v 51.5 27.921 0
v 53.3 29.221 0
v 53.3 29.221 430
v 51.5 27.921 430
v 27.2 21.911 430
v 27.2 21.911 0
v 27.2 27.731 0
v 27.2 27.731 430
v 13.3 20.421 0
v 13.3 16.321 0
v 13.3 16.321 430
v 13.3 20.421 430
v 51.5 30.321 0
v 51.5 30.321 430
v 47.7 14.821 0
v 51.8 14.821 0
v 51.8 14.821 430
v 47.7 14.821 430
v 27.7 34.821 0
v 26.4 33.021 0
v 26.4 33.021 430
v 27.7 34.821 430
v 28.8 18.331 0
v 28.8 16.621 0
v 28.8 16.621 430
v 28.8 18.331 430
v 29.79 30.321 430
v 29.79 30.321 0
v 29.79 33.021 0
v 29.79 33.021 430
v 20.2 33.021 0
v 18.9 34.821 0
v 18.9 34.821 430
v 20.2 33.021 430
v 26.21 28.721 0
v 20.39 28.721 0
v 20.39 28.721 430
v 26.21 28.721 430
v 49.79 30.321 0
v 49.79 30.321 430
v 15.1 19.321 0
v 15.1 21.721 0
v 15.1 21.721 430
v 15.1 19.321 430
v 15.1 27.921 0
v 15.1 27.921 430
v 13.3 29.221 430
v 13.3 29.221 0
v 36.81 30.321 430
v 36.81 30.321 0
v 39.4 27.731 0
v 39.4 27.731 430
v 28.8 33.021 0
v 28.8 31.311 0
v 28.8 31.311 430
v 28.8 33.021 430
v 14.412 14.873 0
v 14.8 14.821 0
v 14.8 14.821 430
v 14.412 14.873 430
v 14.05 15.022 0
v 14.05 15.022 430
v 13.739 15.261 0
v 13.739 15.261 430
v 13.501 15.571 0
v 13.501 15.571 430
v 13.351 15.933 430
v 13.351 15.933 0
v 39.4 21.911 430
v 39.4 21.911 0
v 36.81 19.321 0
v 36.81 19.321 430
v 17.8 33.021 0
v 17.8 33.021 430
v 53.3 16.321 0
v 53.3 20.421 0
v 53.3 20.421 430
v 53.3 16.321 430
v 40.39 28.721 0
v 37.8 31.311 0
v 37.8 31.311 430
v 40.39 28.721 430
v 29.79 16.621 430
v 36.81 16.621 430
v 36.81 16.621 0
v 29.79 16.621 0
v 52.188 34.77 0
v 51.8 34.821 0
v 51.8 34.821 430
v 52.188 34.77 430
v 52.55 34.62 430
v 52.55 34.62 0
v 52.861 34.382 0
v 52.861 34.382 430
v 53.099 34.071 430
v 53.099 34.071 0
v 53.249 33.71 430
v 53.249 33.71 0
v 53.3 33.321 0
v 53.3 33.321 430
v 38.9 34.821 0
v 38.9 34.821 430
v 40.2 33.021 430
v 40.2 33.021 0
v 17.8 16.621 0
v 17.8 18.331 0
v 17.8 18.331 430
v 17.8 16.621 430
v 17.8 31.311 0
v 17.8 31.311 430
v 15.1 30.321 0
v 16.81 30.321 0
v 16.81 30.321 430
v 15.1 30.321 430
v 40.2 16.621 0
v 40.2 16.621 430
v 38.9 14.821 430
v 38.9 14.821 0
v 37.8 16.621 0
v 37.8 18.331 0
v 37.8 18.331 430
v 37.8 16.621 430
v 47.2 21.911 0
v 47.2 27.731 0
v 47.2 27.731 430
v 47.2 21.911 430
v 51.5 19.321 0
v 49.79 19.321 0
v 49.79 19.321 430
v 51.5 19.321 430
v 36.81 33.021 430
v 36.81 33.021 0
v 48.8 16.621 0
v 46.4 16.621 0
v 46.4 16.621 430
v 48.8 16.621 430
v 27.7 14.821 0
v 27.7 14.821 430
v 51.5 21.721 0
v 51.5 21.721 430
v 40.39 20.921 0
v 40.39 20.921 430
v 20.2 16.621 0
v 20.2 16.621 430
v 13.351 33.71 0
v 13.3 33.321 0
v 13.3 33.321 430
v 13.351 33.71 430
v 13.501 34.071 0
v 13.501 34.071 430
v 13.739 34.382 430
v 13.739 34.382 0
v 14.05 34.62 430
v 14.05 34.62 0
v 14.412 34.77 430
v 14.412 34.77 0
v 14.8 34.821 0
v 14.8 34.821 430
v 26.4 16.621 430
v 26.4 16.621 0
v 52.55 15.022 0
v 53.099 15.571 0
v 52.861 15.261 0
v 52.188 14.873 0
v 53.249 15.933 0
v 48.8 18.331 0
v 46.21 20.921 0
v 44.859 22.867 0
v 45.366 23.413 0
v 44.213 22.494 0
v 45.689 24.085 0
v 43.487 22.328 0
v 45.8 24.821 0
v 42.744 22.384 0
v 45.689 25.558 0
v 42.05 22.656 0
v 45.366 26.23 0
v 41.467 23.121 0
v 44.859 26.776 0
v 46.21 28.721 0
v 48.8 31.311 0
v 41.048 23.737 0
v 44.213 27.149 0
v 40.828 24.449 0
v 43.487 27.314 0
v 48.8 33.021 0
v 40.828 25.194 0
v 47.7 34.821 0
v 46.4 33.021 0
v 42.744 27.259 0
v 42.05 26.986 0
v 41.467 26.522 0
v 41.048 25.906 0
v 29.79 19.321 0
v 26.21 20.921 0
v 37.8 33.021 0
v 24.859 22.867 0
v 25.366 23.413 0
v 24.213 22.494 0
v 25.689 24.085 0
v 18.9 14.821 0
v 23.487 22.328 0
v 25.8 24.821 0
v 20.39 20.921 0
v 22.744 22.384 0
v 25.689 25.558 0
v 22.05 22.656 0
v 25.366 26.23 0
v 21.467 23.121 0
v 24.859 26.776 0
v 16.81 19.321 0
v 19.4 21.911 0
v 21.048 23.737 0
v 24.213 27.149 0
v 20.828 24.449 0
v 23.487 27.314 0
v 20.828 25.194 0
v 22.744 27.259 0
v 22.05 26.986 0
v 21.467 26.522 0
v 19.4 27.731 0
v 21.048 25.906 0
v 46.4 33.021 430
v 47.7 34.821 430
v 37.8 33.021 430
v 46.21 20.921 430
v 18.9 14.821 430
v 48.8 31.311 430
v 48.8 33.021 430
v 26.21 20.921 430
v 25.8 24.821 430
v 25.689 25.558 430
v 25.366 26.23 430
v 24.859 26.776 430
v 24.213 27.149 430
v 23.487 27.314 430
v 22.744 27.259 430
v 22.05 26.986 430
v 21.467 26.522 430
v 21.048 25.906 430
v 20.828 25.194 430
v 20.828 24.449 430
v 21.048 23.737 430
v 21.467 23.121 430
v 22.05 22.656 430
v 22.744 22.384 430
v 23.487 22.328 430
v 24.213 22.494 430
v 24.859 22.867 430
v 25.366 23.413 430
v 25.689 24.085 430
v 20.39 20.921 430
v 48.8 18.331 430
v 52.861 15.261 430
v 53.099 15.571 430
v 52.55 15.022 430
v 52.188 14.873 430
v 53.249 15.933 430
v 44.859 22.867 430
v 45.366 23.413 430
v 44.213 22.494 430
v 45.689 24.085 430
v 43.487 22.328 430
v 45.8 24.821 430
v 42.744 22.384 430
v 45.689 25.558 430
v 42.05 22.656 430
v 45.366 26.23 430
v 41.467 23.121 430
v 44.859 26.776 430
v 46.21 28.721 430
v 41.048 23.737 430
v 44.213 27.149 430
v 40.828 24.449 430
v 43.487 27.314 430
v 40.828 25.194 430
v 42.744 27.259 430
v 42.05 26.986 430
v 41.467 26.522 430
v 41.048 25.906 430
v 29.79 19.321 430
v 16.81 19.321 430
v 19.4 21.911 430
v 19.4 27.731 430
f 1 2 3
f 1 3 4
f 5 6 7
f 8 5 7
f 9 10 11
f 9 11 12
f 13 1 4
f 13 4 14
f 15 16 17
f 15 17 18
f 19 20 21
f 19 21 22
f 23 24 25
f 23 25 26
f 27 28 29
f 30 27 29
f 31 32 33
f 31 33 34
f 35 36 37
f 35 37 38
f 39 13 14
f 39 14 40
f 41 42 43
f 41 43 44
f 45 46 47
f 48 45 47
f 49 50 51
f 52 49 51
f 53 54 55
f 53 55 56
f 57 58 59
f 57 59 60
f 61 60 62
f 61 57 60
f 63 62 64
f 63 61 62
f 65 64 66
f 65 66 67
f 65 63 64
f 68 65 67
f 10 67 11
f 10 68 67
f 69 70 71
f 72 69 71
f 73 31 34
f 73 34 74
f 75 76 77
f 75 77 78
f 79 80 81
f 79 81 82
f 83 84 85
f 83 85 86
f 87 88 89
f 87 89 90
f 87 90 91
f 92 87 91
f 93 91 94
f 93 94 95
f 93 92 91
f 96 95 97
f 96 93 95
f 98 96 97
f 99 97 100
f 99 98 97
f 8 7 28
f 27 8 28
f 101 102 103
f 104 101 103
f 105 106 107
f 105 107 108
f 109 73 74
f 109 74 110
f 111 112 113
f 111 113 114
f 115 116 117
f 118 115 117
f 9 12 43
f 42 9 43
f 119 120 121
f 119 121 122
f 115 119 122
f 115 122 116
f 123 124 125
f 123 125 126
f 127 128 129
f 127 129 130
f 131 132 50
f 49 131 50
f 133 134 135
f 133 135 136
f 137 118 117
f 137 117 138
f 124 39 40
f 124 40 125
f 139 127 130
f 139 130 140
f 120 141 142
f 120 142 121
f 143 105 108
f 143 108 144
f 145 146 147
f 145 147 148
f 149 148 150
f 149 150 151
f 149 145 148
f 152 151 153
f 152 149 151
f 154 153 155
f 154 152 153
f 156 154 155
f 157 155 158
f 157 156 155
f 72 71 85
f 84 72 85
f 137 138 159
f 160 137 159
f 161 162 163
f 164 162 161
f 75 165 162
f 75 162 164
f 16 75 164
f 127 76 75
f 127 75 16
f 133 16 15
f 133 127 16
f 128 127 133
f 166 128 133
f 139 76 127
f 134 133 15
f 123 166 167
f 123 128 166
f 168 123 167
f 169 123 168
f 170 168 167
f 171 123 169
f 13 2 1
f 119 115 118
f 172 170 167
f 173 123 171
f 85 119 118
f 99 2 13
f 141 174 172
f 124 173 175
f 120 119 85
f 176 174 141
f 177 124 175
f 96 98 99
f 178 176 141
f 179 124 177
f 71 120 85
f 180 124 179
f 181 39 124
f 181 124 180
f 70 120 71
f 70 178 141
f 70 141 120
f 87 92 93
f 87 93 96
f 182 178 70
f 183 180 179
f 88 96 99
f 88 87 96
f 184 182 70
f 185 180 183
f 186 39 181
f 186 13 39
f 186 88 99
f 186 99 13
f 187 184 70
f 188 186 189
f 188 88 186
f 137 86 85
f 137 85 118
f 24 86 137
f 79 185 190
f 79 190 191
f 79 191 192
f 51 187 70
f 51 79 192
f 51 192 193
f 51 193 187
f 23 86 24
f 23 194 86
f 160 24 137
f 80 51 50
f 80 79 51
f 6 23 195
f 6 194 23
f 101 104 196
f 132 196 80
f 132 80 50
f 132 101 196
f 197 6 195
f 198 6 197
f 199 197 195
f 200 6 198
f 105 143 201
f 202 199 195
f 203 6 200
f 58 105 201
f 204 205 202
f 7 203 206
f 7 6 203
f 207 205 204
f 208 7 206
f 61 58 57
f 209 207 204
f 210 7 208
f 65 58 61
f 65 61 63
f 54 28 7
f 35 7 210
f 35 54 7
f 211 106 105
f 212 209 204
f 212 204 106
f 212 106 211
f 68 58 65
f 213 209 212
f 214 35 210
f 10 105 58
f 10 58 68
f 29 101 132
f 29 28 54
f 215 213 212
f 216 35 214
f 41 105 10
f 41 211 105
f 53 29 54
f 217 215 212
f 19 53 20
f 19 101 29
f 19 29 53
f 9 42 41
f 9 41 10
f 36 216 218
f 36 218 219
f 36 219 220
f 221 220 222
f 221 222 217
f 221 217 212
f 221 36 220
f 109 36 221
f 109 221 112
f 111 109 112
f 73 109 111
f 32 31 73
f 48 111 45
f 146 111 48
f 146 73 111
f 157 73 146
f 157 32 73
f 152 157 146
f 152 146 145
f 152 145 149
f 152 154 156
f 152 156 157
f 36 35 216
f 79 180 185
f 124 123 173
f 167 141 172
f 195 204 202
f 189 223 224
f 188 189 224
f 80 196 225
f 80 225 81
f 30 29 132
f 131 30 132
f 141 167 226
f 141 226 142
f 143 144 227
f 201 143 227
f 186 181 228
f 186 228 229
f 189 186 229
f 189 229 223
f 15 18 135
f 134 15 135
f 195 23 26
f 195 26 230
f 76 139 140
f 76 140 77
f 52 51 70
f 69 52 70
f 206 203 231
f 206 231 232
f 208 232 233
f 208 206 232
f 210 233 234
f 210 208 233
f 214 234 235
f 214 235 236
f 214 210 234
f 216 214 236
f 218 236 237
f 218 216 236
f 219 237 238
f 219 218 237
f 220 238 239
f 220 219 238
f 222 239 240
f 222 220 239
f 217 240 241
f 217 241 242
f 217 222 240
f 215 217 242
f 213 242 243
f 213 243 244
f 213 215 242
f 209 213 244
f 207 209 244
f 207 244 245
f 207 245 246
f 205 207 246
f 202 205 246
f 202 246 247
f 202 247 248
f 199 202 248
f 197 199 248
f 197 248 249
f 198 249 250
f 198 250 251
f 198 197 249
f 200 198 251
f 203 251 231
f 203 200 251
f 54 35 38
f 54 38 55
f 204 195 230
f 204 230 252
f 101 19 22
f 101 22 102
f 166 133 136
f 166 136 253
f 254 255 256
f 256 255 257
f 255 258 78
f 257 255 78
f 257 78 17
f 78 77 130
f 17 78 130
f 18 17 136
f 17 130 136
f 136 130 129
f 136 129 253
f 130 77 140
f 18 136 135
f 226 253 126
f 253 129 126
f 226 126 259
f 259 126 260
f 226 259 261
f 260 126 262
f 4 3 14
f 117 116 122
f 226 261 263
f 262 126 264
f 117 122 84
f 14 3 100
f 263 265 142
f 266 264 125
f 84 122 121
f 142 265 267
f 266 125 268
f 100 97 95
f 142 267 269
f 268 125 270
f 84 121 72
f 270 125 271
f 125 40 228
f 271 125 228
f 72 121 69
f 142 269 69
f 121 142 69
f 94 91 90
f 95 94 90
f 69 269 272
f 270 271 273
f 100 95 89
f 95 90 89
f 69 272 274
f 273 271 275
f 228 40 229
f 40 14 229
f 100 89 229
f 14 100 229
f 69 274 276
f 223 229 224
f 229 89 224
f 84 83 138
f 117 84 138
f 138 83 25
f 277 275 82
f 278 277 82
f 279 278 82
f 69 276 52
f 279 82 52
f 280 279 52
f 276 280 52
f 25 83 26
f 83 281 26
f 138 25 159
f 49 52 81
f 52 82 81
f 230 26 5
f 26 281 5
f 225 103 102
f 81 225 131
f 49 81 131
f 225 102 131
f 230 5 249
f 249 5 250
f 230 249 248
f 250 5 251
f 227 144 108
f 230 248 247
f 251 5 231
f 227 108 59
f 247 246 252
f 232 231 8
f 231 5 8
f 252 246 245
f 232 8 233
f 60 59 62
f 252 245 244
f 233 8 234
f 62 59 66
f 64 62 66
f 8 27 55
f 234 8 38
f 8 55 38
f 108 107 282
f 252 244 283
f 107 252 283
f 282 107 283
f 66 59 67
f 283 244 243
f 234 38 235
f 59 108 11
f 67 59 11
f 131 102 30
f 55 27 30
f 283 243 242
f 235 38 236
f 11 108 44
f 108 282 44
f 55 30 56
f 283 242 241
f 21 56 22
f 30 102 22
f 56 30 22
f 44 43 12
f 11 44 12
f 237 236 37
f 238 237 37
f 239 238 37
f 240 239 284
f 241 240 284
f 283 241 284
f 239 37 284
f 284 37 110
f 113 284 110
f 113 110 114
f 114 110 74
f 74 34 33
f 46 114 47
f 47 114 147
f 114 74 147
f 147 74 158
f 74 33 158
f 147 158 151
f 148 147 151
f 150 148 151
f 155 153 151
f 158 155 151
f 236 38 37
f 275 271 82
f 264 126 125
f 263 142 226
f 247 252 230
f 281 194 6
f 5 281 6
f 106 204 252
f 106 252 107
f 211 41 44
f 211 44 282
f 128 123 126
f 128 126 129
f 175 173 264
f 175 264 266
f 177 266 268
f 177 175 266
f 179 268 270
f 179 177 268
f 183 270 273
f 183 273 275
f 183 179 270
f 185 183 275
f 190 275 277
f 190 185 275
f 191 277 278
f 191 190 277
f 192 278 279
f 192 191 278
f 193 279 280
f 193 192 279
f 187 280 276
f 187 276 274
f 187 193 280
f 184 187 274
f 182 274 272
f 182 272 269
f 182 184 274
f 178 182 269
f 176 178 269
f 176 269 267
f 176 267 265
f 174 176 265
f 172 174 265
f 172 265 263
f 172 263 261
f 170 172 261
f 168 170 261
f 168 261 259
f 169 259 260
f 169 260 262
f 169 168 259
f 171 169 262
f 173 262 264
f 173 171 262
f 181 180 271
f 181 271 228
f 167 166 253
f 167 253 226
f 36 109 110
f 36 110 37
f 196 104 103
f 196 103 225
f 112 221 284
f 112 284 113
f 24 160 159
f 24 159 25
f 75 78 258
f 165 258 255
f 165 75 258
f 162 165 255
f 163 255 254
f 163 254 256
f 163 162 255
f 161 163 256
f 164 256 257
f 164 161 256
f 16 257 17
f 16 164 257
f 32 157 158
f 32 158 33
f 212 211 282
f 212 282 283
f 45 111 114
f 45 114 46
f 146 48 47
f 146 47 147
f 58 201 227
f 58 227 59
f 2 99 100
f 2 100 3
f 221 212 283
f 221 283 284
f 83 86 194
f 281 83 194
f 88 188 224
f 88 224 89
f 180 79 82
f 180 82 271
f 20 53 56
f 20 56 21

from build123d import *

# Parameters (mm, degrees)
SKETCH_1_R      = 2.5
EXTRUDE_1_DEPTH = 430


with BuildPart() as part:
    # 草图1 → 凸台-拉伸1 (new body)
    with BuildSketch(Plane.XY):
        with BuildLine():
            Line((14.8, 34.821428571), (18.9, 34.821428571))
            Line((18.9, 34.821428571), (20.2, 33.021428571))
            Line((20.2, 33.021428571), (17.8, 33.021428571))
            Line((17.8, 33.021428571), (17.8, 31.311378065))
            Line((17.8, 31.311378065), (20.389949494, 28.721428571))
            Line((20.389949494, 28.721428571), (26.210050506, 28.721428571))
            Line((26.210050506, 28.721428571), (28.8, 31.311378065))
            Line((28.8, 31.311378065), (28.8, 33.021428571))
            Line((28.8, 33.021428571), (26.4, 33.021428571))
            Line((26.4, 33.021428571), (27.7, 34.821428571))
            Line((27.7, 34.821428571), (38.9, 34.821428571))
            Line((38.9, 34.821428571), (40.2, 33.021428571))
            Line((40.2, 33.021428571), (37.8, 33.021428571))
            Line((37.8, 33.021428571), (37.8, 31.311378065))
            Line((37.8, 31.311378065), (40.389949494, 28.721428571))
            Line((40.389949494, 28.721428571), (46.210050506, 28.721428571))
            Line((46.210050506, 28.721428571), (48.8, 31.311378065))
            Line((48.8, 31.311378065), (48.8, 33.021428571))
            Line((48.8, 33.021428571), (46.4, 33.021428571))
            Line((46.4, 33.021428571), (47.7, 34.821428571))
            Line((47.7, 34.821428571), (51.8, 34.821428571))
            ThreePointArc((51.8, 34.821428571), (52.860660172, 34.382088743), (53.3, 33.321428571))
            Line((53.3, 33.321428571), (53.3, 29.221428571))
            Line((53.3, 29.221428571), (51.5, 27.921428571))
            Line((51.5, 27.921428571), (51.5, 30.321428571))
            Line((51.5, 30.321428571), (49.789949494, 30.321428571))
            Line((49.789949494, 30.321428571), (47.2, 27.731479078))
            Line((47.2, 27.731479078), (47.2, 21.911378065))
            Line((47.2, 21.911378065), (49.789949494, 19.321428571))
            Line((49.789949494, 19.321428571), (51.5, 19.321428571))
            Line((51.5, 19.321428571), (51.5, 21.721428571))
            Line((51.5, 21.721428571), (53.3, 20.421428571))
            Line((53.3, 20.421428571), (53.3, 16.321428571))
            ThreePointArc((53.3, 16.321428571), (52.860660172, 15.2607684), (51.8, 14.821428571))
            Line((51.8, 14.821428571), (47.7, 14.821428571))
            Line((47.7, 14.821428571), (46.4, 16.621428571))
            Line((46.4, 16.621428571), (48.8, 16.621428571))
            Line((48.8, 16.621428571), (48.8, 18.331479078))
            Line((48.8, 18.331479078), (46.210050506, 20.921428571))
            Line((46.210050506, 20.921428571), (40.389949494, 20.921428571))
            Line((40.389949494, 20.921428571), (37.8, 18.331479078))
            Line((37.8, 18.331479078), (37.8, 16.621428571))
            Line((37.8, 16.621428571), (40.2, 16.621428571))
            Line((40.2, 16.621428571), (38.9, 14.821428571))
            Line((38.9, 14.821428571), (27.7, 14.821428571))
            Line((27.7, 14.821428571), (26.4, 16.621428571))
            Line((26.4, 16.621428571), (28.8, 16.621428571))
            Line((28.8, 16.621428571), (28.8, 18.331479078))
            Line((28.8, 18.331479078), (26.210050506, 20.921428571))
            Line((26.210050506, 20.921428571), (20.389949494, 20.921428571))
            Line((20.389949494, 20.921428571), (17.8, 18.331479078))
            Line((17.8, 18.331479078), (17.8, 16.621428571))
            Line((17.8, 16.621428571), (20.2, 16.621428571))
            Line((20.2, 16.621428571), (18.9, 14.821428571))
            Line((18.9, 14.821428571), (14.8, 14.821428571))
            ThreePointArc((14.8, 14.821428571), (13.739339828, 15.2607684), (13.3, 16.321428571))
            Line((13.3, 16.321428571), (13.3, 20.421428571))
            Line((13.3, 20.421428571), (15.1, 21.721428571))
            Line((15.1, 21.721428571), (15.1, 19.321428571))
            Line((15.1, 19.321428571), (16.810050506, 19.321428571))
            Line((16.810050506, 19.321428571), (19.4, 21.911378065))
            Line((19.4, 21.911378065), (19.4, 27.731479078))
            Line((19.4, 27.731479078), (16.810050506, 30.321428571))
            Line((16.810050506, 30.321428571), (15.1, 30.321428571))
            Line((15.1, 30.321428571), (15.1, 27.921428571))
            Line((15.1, 27.921428571), (13.3, 29.221428571))
            Line((13.3, 29.221428571), (13.3, 33.321428571))
            ThreePointArc((13.3, 33.321428571), (13.739339828, 34.382088743), (14.8, 34.821428571))
        make_face()
        with Locations((23.3, 24.821428571)):
            Circle(SKETCH_1_R, mode=Mode.SUBTRACT)
        with Locations((43.3, 24.821428571)):
            Circle(SKETCH_1_R, mode=Mode.SUBTRACT)
        Polygon((27.2, 27.731479078), (29.789949494, 30.321428571), (29.789949494, 33.021428571), (36.810050506, 33.021428571), (36.810050506, 30.321428571), (39.4, 27.731479078), (39.4, 21.911378065), (36.810050506, 19.321428571), (36.810050506, 16.621428571), (29.789949494, 16.621428571), (29.789949494, 19.321428571), (27.2, 21.911378065), align=None, mode=Mode.SUBTRACT)
    extrude(amount=EXTRUDE_1_DEPTH)


solid = part.part
